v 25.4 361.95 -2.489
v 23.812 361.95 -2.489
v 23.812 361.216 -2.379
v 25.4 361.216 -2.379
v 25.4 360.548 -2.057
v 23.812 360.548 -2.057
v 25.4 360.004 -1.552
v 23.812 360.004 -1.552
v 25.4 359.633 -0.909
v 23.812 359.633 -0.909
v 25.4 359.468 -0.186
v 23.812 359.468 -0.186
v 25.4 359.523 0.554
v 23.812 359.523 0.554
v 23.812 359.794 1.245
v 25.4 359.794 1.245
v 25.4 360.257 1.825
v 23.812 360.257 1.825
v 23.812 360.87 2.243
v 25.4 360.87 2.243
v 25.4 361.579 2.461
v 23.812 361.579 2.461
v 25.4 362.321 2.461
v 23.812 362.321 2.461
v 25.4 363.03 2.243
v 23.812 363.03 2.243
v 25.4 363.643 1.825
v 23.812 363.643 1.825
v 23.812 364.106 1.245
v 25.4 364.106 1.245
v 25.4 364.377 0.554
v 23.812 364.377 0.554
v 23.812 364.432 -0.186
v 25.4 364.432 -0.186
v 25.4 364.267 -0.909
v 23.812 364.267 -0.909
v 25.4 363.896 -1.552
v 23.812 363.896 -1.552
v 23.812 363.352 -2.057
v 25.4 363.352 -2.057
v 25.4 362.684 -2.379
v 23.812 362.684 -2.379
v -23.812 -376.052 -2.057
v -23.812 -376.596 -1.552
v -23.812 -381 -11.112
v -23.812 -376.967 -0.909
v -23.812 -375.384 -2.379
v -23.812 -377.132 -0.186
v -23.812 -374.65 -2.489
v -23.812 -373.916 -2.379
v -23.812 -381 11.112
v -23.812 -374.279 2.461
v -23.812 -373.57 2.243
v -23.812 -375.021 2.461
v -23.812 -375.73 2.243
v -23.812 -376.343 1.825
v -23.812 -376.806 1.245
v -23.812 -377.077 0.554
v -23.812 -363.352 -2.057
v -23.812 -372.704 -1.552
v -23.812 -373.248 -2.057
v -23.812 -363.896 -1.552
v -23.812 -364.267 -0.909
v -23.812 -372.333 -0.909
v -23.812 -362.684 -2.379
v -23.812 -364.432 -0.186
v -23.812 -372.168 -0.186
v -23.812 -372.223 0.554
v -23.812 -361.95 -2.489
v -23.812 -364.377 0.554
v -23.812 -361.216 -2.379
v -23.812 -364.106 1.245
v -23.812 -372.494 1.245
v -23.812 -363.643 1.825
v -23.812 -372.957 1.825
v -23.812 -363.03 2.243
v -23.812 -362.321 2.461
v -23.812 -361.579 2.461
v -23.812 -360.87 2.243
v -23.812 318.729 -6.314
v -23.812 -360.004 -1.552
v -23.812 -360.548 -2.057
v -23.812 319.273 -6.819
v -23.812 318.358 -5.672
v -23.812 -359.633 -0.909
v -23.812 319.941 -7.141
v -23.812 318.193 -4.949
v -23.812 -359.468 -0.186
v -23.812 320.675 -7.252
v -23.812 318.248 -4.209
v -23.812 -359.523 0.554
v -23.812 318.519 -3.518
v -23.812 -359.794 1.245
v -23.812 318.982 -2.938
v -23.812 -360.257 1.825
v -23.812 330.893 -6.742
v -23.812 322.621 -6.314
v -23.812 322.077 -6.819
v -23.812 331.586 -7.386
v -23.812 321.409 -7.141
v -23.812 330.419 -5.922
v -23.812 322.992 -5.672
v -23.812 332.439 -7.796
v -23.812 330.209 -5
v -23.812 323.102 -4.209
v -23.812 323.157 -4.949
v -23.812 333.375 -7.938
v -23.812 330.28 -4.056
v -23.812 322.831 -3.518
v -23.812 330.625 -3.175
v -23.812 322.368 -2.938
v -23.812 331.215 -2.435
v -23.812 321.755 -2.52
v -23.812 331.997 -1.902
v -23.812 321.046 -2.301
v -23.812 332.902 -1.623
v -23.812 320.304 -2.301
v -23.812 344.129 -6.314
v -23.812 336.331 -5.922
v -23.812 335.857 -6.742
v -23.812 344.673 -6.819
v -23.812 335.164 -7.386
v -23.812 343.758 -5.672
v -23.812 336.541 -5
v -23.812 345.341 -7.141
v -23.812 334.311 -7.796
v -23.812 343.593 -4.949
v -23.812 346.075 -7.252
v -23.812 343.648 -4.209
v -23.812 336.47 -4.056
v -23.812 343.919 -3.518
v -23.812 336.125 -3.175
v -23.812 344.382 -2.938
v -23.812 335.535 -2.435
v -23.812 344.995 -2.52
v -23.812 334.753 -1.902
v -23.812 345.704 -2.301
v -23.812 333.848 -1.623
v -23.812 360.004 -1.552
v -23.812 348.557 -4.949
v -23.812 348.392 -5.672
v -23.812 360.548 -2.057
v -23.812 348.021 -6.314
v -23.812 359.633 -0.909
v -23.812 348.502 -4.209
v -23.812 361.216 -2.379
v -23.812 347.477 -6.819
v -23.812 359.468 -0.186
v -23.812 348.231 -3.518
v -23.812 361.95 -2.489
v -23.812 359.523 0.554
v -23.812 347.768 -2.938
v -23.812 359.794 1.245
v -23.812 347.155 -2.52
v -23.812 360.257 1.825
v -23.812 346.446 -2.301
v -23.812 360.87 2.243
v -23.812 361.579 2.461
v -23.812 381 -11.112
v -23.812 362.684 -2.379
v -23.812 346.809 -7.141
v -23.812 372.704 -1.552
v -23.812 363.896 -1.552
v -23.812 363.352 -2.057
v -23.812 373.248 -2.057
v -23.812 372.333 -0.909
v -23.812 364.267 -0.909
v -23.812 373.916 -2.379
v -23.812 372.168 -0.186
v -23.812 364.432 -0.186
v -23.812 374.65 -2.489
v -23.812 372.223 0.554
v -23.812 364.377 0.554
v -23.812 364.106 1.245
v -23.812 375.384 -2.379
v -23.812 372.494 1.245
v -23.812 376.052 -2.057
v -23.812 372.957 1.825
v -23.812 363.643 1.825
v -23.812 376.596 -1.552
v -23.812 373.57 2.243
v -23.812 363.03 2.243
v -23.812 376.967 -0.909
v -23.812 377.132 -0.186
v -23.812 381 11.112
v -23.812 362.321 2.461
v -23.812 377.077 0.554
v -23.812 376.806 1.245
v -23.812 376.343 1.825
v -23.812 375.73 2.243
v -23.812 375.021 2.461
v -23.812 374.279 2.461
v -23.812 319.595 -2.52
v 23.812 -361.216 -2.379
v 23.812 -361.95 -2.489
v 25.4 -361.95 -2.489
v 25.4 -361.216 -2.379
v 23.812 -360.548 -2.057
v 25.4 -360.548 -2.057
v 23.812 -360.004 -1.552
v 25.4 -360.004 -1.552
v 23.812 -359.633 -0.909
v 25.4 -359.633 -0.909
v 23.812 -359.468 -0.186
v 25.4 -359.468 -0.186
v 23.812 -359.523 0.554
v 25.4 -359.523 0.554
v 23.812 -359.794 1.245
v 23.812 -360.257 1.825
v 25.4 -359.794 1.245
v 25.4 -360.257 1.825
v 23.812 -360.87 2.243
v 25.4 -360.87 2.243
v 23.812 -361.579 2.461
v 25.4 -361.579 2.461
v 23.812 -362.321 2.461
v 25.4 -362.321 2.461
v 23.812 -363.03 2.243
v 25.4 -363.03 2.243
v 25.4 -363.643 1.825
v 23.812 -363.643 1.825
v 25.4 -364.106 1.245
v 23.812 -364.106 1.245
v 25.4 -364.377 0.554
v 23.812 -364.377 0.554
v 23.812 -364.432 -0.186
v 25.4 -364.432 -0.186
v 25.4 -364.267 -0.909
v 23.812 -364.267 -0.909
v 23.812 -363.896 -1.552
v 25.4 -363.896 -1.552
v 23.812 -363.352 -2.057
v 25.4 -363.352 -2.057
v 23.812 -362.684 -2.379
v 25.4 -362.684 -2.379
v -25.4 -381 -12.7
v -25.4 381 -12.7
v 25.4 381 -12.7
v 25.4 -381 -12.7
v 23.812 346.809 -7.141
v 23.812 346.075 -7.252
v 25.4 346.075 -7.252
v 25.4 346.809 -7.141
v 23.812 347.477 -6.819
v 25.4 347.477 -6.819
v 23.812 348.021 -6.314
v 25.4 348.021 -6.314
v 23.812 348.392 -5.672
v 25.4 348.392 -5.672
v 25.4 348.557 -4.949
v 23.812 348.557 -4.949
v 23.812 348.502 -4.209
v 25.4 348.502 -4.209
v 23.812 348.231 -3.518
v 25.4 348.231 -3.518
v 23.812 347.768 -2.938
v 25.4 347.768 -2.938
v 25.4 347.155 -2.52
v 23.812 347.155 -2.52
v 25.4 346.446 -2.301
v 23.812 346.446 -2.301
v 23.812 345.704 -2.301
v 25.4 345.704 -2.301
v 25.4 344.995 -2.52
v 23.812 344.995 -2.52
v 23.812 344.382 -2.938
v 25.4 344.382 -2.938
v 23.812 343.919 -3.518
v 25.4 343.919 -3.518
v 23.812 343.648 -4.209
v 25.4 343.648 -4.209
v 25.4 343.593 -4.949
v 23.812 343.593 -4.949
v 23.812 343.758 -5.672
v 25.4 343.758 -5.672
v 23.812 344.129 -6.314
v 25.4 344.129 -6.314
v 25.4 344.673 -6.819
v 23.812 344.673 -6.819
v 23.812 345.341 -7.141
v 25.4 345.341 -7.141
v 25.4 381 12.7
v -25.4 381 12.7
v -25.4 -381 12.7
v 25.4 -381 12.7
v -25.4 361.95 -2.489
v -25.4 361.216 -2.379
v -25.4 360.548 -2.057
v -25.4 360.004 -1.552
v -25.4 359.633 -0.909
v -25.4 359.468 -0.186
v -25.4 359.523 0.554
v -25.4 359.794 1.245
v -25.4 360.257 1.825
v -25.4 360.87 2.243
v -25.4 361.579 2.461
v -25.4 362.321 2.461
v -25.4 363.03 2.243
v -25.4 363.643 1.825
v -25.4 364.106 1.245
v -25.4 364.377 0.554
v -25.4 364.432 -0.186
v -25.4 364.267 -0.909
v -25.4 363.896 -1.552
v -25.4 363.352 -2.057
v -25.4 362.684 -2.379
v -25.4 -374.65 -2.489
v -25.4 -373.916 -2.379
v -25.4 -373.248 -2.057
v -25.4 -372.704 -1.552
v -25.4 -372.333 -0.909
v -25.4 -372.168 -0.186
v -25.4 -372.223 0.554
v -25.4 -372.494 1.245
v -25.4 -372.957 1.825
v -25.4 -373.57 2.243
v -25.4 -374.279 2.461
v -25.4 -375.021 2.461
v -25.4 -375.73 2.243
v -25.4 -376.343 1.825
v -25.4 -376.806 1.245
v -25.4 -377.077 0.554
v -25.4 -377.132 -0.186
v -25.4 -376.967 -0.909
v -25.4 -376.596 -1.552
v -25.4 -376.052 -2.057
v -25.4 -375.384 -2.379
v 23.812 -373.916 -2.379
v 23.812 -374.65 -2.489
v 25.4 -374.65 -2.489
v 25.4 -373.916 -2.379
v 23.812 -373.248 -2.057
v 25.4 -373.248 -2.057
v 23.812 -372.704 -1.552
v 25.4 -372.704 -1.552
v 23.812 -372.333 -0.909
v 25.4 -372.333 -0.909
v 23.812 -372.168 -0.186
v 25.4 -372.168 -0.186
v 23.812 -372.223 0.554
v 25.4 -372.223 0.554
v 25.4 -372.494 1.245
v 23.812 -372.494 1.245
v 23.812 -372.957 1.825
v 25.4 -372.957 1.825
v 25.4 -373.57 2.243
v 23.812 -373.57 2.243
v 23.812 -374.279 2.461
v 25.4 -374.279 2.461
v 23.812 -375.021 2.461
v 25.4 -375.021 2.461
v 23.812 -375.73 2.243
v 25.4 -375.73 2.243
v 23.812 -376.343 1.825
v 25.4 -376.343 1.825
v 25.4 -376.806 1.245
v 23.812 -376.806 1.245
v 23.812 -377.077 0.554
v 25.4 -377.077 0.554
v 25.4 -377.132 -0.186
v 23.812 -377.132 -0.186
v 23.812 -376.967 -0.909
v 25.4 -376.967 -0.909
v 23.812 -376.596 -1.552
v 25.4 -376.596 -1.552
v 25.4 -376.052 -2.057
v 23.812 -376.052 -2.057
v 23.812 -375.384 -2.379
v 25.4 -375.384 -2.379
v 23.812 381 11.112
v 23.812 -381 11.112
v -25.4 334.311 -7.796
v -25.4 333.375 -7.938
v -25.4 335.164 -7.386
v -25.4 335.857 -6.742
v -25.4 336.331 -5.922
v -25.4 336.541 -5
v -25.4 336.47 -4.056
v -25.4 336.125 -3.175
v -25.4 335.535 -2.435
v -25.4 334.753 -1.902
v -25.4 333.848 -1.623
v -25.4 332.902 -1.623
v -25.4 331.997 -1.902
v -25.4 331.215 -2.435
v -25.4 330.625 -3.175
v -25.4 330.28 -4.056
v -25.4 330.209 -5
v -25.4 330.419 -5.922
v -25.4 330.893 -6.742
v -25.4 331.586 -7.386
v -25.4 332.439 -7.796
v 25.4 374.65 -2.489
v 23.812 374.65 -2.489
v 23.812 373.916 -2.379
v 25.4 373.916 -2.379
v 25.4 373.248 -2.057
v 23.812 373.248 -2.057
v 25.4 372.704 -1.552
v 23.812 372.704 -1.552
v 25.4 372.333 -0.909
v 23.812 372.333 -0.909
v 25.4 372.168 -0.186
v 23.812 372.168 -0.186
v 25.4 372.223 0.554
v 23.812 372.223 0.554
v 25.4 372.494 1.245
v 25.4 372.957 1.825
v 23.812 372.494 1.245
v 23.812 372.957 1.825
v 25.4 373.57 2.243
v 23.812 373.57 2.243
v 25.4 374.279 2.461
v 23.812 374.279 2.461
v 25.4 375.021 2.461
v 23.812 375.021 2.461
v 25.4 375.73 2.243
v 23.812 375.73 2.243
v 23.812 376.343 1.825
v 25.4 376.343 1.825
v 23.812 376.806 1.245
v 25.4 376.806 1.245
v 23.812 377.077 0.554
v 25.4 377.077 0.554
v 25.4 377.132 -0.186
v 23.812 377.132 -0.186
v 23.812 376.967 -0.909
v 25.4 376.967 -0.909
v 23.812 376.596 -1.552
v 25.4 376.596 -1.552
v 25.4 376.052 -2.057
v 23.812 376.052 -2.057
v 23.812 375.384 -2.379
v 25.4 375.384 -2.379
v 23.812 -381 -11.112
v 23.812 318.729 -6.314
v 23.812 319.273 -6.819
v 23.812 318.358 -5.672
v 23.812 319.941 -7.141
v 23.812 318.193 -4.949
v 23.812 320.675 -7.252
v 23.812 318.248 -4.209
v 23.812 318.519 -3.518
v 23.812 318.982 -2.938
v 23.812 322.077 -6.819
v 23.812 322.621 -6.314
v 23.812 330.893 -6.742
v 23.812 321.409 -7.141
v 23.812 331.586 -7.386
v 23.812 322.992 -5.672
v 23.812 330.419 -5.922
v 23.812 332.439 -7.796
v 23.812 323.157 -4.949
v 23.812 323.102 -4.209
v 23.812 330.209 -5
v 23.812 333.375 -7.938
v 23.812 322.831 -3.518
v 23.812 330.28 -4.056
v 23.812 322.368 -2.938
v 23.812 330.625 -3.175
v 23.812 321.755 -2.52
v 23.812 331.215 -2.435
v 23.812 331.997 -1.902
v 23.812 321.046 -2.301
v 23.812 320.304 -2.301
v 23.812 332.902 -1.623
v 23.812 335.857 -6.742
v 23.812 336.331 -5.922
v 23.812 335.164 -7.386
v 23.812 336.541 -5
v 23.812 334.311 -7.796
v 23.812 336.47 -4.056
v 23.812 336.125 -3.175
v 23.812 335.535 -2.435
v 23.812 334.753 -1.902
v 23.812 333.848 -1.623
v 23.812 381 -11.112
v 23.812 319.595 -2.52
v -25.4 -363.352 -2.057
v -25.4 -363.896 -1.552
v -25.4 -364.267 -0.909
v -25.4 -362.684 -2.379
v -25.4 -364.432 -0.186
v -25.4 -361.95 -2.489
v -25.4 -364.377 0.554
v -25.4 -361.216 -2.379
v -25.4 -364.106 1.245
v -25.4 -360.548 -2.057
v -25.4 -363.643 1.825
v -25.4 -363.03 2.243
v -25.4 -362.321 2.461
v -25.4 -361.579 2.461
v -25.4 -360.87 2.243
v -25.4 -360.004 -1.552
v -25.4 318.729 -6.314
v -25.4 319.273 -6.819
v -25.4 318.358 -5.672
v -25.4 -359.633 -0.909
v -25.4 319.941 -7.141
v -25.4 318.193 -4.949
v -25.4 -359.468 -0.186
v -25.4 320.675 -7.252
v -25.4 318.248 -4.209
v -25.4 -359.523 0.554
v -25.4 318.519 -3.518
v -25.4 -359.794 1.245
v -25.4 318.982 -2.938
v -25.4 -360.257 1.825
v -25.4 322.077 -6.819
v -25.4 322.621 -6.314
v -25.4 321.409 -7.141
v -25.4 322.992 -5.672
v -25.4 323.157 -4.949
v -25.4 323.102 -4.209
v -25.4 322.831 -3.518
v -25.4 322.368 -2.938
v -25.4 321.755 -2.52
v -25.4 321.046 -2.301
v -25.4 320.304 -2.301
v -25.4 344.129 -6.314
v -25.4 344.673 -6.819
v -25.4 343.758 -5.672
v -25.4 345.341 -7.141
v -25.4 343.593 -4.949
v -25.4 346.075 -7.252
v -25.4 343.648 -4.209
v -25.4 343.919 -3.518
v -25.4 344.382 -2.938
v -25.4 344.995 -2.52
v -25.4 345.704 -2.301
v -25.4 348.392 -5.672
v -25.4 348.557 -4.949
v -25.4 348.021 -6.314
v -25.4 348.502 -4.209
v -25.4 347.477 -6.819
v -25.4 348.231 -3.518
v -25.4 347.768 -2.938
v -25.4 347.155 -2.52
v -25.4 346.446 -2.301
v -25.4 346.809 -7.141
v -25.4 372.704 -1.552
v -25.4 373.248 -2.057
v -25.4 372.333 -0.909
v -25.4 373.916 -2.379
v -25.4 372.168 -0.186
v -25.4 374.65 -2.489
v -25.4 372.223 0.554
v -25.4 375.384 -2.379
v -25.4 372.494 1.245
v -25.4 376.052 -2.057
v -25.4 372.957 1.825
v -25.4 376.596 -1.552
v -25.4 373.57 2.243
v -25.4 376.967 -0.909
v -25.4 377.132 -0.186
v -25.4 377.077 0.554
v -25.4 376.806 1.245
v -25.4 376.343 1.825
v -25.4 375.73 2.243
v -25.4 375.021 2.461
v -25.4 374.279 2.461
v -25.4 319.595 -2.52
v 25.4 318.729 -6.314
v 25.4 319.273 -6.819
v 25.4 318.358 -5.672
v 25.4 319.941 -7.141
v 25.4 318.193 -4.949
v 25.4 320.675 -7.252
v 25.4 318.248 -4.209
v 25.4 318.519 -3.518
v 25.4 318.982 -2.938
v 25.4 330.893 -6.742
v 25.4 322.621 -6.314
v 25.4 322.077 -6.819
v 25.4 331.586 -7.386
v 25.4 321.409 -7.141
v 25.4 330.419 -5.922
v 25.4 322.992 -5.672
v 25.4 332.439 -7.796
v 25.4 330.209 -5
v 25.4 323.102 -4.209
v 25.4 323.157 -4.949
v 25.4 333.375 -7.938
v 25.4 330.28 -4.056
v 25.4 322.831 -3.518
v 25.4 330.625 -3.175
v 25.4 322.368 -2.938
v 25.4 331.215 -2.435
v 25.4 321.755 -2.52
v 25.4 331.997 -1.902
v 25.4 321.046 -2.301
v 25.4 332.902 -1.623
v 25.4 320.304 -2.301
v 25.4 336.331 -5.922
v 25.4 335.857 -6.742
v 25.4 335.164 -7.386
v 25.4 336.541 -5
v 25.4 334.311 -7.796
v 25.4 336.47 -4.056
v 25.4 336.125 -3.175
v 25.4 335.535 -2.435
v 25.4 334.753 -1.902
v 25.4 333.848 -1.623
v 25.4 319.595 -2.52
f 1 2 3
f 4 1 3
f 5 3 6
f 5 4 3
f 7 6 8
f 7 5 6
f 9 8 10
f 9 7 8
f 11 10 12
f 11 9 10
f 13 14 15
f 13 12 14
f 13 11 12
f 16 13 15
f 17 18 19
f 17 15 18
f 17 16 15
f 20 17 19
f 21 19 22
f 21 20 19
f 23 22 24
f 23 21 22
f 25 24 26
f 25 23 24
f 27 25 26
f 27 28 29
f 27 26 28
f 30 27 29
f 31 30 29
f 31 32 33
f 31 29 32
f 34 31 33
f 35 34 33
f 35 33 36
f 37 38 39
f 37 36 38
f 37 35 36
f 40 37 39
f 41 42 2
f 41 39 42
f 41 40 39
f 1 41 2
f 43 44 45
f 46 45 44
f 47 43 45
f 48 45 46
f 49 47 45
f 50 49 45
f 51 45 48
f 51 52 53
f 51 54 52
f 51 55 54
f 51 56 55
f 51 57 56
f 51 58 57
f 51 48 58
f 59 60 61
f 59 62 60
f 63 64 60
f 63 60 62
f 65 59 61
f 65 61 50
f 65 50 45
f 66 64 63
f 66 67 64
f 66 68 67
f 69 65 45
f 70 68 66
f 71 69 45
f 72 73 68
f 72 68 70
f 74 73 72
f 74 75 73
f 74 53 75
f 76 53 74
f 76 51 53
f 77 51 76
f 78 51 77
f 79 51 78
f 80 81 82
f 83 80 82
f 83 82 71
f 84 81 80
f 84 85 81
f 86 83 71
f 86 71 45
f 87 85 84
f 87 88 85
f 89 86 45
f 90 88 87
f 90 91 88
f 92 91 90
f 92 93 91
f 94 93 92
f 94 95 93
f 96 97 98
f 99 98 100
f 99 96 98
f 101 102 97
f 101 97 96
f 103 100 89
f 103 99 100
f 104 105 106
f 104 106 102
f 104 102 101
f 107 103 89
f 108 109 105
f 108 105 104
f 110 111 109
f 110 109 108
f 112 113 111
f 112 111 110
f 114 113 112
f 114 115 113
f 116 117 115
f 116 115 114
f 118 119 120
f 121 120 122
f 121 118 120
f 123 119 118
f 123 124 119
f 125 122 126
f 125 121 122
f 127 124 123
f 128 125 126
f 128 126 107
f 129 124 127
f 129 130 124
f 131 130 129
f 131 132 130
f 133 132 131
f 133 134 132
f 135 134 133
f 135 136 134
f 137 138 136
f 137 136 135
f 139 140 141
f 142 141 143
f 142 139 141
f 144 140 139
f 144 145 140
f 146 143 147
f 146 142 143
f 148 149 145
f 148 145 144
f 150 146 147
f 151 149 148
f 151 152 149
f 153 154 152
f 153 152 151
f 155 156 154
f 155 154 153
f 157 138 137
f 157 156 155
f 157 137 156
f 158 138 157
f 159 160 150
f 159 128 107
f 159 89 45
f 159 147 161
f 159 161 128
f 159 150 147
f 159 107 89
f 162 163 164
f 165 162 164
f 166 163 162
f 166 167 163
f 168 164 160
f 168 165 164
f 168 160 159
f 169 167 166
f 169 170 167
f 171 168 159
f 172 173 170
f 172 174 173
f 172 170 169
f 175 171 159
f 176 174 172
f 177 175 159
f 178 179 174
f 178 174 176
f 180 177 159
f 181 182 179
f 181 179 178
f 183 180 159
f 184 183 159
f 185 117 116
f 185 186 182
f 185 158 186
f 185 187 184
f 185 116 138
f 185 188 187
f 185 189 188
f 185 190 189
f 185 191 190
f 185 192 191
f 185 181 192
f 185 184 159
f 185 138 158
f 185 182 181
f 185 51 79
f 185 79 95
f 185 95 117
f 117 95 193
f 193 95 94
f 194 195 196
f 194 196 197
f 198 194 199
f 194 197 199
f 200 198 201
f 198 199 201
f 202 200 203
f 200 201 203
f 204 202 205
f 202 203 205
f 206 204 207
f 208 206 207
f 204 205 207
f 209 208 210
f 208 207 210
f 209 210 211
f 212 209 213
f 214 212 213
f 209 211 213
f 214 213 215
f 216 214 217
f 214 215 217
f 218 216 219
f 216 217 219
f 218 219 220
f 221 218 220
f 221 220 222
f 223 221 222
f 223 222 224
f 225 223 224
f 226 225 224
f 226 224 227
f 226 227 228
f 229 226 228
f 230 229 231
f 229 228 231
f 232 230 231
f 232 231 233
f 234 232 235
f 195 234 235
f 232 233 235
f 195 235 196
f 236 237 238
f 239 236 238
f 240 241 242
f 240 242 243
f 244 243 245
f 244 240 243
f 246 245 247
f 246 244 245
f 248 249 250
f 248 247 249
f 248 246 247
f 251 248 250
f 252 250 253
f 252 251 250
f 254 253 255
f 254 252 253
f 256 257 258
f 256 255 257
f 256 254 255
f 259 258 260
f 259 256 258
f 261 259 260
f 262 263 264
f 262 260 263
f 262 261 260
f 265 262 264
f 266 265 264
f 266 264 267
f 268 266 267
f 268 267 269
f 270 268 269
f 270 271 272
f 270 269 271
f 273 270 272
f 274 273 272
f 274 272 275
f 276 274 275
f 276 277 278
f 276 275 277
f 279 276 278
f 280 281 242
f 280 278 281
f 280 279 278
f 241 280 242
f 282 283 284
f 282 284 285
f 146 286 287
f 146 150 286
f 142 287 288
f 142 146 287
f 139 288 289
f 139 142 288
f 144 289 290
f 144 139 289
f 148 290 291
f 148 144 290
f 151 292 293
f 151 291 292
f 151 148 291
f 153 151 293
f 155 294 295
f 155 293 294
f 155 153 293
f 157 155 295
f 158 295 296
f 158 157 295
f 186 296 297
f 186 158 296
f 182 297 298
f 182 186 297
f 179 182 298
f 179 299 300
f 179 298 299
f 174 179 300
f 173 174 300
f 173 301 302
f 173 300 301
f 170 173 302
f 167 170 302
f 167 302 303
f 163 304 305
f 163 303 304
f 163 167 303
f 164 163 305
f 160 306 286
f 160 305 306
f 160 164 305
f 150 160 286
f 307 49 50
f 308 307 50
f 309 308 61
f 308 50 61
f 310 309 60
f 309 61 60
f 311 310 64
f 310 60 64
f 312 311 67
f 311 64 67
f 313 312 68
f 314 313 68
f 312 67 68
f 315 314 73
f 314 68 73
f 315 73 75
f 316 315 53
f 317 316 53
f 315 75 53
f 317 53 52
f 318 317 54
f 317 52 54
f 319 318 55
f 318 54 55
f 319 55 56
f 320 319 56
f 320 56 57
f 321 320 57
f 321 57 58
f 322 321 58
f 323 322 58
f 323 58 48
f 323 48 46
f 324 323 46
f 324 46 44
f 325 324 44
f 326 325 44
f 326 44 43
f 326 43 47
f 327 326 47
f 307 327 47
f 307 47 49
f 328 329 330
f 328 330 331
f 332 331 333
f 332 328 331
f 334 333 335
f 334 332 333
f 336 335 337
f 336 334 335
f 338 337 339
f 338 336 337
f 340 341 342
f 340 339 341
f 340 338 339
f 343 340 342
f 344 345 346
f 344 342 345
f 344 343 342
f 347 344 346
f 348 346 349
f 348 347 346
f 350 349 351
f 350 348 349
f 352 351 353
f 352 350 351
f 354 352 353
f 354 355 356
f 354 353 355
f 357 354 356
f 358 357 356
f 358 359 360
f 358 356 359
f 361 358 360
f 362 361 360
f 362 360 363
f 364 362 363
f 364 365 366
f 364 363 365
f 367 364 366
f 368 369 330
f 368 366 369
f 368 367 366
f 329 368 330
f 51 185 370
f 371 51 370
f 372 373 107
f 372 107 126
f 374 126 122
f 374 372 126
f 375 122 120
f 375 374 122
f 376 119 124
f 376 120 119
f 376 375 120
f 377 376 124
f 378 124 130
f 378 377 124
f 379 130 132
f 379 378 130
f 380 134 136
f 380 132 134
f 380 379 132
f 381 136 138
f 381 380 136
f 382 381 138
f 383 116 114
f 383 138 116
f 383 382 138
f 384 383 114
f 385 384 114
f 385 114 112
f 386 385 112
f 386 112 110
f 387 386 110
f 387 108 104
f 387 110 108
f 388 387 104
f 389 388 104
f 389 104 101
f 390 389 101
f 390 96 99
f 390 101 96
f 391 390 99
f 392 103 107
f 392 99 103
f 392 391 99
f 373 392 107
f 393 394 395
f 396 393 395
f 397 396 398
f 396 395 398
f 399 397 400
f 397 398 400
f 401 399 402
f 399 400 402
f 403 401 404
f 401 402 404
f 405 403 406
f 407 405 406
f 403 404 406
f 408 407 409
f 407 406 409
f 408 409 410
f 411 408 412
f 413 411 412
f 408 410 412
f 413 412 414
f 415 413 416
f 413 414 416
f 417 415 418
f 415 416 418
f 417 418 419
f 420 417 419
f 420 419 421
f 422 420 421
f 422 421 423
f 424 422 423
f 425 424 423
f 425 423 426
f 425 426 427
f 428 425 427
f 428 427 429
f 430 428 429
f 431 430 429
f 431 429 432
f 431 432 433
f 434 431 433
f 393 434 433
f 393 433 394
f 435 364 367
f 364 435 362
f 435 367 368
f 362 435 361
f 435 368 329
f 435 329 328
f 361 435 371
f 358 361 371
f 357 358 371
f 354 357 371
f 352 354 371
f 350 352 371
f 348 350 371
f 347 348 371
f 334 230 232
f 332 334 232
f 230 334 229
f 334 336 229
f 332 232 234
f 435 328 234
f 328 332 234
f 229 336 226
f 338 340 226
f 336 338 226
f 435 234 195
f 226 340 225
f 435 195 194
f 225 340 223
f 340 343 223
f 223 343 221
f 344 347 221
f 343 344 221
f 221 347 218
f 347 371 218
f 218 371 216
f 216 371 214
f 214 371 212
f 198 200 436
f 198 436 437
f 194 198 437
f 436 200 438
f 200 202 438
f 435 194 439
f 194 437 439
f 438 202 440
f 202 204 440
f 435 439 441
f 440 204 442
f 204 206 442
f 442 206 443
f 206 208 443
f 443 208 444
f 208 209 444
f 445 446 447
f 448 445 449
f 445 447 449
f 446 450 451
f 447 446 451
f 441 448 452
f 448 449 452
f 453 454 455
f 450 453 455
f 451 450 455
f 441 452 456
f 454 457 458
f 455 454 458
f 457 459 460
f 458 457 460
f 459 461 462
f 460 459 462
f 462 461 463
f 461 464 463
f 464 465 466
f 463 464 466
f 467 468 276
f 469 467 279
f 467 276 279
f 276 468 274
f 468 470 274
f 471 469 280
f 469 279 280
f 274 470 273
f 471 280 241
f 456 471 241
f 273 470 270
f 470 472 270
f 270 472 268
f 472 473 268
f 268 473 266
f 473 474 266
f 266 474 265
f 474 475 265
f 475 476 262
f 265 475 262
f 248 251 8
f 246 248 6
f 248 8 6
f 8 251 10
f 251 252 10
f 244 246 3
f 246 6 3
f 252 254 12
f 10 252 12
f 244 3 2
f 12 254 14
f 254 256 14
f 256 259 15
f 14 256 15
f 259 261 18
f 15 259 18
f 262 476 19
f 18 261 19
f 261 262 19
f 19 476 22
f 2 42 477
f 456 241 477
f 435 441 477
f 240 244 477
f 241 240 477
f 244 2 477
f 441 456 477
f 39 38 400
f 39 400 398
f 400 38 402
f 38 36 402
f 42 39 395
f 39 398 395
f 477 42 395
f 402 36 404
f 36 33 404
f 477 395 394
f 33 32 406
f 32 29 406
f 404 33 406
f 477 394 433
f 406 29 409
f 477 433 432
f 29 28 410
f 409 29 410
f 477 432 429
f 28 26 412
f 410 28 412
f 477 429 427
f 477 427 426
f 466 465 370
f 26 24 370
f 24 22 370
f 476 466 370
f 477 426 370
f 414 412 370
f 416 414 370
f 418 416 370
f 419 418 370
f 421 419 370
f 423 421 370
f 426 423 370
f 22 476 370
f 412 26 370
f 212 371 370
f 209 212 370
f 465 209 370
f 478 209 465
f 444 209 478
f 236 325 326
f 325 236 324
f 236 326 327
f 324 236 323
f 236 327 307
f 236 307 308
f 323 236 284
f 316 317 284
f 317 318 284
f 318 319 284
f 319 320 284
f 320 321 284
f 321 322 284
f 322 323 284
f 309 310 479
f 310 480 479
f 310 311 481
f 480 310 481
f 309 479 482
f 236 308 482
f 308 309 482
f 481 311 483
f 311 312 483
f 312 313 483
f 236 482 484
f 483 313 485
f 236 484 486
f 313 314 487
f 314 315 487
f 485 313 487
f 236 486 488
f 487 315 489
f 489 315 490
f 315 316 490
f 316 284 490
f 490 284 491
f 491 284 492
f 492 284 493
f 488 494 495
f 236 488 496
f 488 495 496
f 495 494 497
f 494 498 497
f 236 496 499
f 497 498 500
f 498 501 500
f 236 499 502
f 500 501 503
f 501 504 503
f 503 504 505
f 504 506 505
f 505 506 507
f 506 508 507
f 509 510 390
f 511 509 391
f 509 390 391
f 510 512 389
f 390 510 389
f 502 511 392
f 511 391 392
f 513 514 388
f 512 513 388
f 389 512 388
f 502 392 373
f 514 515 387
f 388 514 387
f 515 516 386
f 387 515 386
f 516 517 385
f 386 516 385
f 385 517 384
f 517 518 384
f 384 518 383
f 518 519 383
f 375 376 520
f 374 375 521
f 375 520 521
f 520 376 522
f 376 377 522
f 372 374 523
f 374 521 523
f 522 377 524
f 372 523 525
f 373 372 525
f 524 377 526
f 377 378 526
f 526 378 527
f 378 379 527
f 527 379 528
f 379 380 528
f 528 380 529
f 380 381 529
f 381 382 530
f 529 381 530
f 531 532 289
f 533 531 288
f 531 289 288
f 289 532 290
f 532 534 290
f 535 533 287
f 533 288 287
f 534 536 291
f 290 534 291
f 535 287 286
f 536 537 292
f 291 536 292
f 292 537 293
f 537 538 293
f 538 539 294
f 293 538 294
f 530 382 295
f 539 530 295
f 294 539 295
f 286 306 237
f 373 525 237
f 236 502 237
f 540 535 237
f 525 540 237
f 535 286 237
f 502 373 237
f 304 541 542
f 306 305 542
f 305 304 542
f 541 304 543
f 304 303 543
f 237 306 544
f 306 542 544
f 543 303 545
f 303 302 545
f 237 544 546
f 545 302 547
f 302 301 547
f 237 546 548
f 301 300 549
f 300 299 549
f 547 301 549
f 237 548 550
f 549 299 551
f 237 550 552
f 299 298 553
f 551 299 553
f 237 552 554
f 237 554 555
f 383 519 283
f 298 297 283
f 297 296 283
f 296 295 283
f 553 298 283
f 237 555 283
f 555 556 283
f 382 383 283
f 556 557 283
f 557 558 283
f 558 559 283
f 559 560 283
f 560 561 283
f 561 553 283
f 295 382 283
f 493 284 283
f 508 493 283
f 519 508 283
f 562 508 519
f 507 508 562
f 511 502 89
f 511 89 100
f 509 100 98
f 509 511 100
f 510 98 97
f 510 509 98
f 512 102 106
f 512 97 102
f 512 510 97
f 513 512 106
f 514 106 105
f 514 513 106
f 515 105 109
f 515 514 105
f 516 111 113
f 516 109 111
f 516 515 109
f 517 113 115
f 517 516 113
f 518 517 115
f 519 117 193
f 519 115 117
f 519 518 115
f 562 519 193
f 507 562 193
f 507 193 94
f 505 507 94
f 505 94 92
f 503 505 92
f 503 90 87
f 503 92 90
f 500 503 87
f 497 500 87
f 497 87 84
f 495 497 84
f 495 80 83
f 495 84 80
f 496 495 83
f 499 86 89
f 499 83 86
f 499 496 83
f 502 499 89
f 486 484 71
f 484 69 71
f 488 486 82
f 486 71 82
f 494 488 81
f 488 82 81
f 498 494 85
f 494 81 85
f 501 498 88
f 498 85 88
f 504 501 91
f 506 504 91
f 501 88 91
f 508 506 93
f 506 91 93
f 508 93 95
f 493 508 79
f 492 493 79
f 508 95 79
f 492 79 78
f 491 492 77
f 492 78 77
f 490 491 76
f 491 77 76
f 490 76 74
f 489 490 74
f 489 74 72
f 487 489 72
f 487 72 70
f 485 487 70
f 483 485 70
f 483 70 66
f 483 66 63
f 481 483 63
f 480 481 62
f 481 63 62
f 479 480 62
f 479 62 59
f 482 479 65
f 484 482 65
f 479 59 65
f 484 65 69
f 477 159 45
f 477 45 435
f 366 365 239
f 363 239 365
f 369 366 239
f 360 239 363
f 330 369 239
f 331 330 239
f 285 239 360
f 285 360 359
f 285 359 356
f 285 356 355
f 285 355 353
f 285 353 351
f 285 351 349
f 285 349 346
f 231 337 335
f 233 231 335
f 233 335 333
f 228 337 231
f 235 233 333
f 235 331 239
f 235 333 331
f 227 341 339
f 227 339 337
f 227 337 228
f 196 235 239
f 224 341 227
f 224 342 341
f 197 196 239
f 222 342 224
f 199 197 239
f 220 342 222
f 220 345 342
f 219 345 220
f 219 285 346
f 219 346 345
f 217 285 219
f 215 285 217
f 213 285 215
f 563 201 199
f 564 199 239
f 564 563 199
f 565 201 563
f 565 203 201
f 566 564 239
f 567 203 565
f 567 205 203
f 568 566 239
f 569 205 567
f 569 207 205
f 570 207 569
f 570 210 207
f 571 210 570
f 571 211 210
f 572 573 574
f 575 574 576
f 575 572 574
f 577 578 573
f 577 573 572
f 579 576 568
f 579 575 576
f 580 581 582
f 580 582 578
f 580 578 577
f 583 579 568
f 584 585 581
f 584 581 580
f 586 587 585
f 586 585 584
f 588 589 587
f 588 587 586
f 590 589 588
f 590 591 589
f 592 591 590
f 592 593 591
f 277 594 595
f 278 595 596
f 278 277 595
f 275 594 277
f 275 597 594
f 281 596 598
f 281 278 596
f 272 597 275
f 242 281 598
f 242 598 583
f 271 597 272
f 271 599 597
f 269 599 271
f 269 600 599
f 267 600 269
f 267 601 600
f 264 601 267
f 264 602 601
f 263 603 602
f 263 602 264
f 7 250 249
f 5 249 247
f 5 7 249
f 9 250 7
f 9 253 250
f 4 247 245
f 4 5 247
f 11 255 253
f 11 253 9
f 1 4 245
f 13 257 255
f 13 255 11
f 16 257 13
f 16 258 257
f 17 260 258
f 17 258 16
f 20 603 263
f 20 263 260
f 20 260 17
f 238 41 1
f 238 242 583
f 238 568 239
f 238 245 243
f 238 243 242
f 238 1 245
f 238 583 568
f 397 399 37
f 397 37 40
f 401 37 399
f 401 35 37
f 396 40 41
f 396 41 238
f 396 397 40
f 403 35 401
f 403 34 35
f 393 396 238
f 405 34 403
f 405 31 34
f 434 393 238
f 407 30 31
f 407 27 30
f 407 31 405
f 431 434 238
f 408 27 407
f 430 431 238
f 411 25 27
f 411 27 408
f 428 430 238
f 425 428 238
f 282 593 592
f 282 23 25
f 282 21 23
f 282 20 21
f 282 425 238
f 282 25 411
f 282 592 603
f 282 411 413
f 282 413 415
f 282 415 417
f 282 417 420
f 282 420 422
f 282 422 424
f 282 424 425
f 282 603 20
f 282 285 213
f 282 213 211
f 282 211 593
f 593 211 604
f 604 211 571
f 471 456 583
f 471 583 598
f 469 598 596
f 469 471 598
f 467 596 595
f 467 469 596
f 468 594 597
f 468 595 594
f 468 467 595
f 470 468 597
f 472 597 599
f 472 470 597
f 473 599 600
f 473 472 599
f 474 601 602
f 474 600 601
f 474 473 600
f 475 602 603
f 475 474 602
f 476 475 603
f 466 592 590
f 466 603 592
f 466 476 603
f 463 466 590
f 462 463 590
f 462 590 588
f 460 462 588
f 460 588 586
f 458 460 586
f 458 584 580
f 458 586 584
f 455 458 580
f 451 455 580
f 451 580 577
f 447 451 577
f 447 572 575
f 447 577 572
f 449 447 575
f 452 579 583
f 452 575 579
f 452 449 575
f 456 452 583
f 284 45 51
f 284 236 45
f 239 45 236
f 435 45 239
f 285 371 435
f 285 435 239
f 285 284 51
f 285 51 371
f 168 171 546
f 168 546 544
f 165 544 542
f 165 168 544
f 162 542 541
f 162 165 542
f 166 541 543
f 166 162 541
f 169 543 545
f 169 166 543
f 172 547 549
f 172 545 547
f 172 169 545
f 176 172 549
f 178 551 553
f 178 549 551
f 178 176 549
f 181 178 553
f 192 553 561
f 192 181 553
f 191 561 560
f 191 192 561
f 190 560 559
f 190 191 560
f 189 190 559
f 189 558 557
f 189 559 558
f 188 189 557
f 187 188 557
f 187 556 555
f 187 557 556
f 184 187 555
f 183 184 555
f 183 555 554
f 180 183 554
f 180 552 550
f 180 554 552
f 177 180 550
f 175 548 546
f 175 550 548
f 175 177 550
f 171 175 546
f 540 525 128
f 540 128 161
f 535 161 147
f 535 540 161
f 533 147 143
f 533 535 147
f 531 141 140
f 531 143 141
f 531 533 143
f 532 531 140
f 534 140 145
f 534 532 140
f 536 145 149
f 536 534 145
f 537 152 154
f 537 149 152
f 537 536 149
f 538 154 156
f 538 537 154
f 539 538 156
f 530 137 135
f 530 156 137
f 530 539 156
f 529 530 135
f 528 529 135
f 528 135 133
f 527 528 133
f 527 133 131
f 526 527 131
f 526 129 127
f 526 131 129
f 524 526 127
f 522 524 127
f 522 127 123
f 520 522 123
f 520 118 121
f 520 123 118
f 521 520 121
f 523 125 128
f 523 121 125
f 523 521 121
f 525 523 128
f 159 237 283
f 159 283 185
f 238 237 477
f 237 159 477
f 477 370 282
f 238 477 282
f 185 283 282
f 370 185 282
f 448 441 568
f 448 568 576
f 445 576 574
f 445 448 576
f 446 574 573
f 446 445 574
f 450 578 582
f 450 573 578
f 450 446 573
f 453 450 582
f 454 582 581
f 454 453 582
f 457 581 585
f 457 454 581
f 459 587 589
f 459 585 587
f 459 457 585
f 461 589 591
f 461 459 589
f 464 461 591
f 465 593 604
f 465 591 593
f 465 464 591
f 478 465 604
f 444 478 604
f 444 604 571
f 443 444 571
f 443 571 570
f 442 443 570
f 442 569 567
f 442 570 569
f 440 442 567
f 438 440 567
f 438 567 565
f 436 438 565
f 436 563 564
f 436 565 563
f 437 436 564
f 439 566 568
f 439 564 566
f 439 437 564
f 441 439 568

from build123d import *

# Parameters (mm, degrees)
SKETCH1_W               = 50.8
SKETCH1_H               = 762
BOSS_EXTRUDE1_DEPTH     = 12.7
SHELL1_T                = -1.5875
SKETCH3_R               = 2.4892
CUT_EXTRUDE1_DEPTH      = 383.056867495
CUT_EXTRUDE2_DEPTH      = 383.056867495
CUT_EXTRUDE2_DEPTH_BACK = 383.056867495
SKETCH4_R               = 3.175
SKETCH4_R_2             = 2.4892


with BuildPart() as part:
    # Sketch1 → Boss-Extrude1 (new, symmetric)
    with BuildSketch(Plane.XY):
        Rectangle(SKETCH1_W, SKETCH1_H)
    extrude(amount=BOSS_EXTRUDE1_DEPTH, both=True)

    # Shell1
    shell1_openings = [part.faces().sort_by_distance(p)[0] for p in [
        (0, -381, 0),
        (0, 381, 0),
    ]]
    offset(amount=SHELL1_T, openings=shell1_openings, kind=Kind.INTERSECTION)

    # Sketch3 → Cut-Extrude1 (cut, symmetric)
    with BuildSketch(Plane(origin=(0, 0, 0), x_dir=(0, 0, -1), z_dir=(1, 0, 0))):
        with Locations((0, -374.65)):
            Circle(SKETCH3_R)
        with Locations((0, -361.95)):
            Circle(SKETCH3_R)
    cut_extrude1 = extrude(amount=CUT_EXTRUDE1_DEPTH, both=True, mode=Mode.SUBTRACT)

    # Sketch4 → Cut-Extrude2 (cut, two sides: drawn at the far end of the back side and taken through both)
    with BuildSketch(Plane(origin=(0, 0, 0), x_dir=(0, 0, -1), z_dir=(1, 0, 0)).offset(-CUT_EXTRUDE2_DEPTH_BACK)):
        with Locations((4.7625, 333.375)):
            Circle(SKETCH4_R)
        with Locations((4.7625, 346.075)):
            Circle(SKETCH4_R_2)
        with Locations((4.7625, 320.675)):
            Circle(SKETCH4_R_2)
    extrude(amount=CUT_EXTRUDE2_DEPTH + CUT_EXTRUDE2_DEPTH_BACK, mode=Mode.SUBTRACT)

    # Mirror1: Cut-Extrude1 across plane
    add(cut_extrude1.mirror(Plane.ZX), mode=Mode.SUBTRACT)


solid = part.part
